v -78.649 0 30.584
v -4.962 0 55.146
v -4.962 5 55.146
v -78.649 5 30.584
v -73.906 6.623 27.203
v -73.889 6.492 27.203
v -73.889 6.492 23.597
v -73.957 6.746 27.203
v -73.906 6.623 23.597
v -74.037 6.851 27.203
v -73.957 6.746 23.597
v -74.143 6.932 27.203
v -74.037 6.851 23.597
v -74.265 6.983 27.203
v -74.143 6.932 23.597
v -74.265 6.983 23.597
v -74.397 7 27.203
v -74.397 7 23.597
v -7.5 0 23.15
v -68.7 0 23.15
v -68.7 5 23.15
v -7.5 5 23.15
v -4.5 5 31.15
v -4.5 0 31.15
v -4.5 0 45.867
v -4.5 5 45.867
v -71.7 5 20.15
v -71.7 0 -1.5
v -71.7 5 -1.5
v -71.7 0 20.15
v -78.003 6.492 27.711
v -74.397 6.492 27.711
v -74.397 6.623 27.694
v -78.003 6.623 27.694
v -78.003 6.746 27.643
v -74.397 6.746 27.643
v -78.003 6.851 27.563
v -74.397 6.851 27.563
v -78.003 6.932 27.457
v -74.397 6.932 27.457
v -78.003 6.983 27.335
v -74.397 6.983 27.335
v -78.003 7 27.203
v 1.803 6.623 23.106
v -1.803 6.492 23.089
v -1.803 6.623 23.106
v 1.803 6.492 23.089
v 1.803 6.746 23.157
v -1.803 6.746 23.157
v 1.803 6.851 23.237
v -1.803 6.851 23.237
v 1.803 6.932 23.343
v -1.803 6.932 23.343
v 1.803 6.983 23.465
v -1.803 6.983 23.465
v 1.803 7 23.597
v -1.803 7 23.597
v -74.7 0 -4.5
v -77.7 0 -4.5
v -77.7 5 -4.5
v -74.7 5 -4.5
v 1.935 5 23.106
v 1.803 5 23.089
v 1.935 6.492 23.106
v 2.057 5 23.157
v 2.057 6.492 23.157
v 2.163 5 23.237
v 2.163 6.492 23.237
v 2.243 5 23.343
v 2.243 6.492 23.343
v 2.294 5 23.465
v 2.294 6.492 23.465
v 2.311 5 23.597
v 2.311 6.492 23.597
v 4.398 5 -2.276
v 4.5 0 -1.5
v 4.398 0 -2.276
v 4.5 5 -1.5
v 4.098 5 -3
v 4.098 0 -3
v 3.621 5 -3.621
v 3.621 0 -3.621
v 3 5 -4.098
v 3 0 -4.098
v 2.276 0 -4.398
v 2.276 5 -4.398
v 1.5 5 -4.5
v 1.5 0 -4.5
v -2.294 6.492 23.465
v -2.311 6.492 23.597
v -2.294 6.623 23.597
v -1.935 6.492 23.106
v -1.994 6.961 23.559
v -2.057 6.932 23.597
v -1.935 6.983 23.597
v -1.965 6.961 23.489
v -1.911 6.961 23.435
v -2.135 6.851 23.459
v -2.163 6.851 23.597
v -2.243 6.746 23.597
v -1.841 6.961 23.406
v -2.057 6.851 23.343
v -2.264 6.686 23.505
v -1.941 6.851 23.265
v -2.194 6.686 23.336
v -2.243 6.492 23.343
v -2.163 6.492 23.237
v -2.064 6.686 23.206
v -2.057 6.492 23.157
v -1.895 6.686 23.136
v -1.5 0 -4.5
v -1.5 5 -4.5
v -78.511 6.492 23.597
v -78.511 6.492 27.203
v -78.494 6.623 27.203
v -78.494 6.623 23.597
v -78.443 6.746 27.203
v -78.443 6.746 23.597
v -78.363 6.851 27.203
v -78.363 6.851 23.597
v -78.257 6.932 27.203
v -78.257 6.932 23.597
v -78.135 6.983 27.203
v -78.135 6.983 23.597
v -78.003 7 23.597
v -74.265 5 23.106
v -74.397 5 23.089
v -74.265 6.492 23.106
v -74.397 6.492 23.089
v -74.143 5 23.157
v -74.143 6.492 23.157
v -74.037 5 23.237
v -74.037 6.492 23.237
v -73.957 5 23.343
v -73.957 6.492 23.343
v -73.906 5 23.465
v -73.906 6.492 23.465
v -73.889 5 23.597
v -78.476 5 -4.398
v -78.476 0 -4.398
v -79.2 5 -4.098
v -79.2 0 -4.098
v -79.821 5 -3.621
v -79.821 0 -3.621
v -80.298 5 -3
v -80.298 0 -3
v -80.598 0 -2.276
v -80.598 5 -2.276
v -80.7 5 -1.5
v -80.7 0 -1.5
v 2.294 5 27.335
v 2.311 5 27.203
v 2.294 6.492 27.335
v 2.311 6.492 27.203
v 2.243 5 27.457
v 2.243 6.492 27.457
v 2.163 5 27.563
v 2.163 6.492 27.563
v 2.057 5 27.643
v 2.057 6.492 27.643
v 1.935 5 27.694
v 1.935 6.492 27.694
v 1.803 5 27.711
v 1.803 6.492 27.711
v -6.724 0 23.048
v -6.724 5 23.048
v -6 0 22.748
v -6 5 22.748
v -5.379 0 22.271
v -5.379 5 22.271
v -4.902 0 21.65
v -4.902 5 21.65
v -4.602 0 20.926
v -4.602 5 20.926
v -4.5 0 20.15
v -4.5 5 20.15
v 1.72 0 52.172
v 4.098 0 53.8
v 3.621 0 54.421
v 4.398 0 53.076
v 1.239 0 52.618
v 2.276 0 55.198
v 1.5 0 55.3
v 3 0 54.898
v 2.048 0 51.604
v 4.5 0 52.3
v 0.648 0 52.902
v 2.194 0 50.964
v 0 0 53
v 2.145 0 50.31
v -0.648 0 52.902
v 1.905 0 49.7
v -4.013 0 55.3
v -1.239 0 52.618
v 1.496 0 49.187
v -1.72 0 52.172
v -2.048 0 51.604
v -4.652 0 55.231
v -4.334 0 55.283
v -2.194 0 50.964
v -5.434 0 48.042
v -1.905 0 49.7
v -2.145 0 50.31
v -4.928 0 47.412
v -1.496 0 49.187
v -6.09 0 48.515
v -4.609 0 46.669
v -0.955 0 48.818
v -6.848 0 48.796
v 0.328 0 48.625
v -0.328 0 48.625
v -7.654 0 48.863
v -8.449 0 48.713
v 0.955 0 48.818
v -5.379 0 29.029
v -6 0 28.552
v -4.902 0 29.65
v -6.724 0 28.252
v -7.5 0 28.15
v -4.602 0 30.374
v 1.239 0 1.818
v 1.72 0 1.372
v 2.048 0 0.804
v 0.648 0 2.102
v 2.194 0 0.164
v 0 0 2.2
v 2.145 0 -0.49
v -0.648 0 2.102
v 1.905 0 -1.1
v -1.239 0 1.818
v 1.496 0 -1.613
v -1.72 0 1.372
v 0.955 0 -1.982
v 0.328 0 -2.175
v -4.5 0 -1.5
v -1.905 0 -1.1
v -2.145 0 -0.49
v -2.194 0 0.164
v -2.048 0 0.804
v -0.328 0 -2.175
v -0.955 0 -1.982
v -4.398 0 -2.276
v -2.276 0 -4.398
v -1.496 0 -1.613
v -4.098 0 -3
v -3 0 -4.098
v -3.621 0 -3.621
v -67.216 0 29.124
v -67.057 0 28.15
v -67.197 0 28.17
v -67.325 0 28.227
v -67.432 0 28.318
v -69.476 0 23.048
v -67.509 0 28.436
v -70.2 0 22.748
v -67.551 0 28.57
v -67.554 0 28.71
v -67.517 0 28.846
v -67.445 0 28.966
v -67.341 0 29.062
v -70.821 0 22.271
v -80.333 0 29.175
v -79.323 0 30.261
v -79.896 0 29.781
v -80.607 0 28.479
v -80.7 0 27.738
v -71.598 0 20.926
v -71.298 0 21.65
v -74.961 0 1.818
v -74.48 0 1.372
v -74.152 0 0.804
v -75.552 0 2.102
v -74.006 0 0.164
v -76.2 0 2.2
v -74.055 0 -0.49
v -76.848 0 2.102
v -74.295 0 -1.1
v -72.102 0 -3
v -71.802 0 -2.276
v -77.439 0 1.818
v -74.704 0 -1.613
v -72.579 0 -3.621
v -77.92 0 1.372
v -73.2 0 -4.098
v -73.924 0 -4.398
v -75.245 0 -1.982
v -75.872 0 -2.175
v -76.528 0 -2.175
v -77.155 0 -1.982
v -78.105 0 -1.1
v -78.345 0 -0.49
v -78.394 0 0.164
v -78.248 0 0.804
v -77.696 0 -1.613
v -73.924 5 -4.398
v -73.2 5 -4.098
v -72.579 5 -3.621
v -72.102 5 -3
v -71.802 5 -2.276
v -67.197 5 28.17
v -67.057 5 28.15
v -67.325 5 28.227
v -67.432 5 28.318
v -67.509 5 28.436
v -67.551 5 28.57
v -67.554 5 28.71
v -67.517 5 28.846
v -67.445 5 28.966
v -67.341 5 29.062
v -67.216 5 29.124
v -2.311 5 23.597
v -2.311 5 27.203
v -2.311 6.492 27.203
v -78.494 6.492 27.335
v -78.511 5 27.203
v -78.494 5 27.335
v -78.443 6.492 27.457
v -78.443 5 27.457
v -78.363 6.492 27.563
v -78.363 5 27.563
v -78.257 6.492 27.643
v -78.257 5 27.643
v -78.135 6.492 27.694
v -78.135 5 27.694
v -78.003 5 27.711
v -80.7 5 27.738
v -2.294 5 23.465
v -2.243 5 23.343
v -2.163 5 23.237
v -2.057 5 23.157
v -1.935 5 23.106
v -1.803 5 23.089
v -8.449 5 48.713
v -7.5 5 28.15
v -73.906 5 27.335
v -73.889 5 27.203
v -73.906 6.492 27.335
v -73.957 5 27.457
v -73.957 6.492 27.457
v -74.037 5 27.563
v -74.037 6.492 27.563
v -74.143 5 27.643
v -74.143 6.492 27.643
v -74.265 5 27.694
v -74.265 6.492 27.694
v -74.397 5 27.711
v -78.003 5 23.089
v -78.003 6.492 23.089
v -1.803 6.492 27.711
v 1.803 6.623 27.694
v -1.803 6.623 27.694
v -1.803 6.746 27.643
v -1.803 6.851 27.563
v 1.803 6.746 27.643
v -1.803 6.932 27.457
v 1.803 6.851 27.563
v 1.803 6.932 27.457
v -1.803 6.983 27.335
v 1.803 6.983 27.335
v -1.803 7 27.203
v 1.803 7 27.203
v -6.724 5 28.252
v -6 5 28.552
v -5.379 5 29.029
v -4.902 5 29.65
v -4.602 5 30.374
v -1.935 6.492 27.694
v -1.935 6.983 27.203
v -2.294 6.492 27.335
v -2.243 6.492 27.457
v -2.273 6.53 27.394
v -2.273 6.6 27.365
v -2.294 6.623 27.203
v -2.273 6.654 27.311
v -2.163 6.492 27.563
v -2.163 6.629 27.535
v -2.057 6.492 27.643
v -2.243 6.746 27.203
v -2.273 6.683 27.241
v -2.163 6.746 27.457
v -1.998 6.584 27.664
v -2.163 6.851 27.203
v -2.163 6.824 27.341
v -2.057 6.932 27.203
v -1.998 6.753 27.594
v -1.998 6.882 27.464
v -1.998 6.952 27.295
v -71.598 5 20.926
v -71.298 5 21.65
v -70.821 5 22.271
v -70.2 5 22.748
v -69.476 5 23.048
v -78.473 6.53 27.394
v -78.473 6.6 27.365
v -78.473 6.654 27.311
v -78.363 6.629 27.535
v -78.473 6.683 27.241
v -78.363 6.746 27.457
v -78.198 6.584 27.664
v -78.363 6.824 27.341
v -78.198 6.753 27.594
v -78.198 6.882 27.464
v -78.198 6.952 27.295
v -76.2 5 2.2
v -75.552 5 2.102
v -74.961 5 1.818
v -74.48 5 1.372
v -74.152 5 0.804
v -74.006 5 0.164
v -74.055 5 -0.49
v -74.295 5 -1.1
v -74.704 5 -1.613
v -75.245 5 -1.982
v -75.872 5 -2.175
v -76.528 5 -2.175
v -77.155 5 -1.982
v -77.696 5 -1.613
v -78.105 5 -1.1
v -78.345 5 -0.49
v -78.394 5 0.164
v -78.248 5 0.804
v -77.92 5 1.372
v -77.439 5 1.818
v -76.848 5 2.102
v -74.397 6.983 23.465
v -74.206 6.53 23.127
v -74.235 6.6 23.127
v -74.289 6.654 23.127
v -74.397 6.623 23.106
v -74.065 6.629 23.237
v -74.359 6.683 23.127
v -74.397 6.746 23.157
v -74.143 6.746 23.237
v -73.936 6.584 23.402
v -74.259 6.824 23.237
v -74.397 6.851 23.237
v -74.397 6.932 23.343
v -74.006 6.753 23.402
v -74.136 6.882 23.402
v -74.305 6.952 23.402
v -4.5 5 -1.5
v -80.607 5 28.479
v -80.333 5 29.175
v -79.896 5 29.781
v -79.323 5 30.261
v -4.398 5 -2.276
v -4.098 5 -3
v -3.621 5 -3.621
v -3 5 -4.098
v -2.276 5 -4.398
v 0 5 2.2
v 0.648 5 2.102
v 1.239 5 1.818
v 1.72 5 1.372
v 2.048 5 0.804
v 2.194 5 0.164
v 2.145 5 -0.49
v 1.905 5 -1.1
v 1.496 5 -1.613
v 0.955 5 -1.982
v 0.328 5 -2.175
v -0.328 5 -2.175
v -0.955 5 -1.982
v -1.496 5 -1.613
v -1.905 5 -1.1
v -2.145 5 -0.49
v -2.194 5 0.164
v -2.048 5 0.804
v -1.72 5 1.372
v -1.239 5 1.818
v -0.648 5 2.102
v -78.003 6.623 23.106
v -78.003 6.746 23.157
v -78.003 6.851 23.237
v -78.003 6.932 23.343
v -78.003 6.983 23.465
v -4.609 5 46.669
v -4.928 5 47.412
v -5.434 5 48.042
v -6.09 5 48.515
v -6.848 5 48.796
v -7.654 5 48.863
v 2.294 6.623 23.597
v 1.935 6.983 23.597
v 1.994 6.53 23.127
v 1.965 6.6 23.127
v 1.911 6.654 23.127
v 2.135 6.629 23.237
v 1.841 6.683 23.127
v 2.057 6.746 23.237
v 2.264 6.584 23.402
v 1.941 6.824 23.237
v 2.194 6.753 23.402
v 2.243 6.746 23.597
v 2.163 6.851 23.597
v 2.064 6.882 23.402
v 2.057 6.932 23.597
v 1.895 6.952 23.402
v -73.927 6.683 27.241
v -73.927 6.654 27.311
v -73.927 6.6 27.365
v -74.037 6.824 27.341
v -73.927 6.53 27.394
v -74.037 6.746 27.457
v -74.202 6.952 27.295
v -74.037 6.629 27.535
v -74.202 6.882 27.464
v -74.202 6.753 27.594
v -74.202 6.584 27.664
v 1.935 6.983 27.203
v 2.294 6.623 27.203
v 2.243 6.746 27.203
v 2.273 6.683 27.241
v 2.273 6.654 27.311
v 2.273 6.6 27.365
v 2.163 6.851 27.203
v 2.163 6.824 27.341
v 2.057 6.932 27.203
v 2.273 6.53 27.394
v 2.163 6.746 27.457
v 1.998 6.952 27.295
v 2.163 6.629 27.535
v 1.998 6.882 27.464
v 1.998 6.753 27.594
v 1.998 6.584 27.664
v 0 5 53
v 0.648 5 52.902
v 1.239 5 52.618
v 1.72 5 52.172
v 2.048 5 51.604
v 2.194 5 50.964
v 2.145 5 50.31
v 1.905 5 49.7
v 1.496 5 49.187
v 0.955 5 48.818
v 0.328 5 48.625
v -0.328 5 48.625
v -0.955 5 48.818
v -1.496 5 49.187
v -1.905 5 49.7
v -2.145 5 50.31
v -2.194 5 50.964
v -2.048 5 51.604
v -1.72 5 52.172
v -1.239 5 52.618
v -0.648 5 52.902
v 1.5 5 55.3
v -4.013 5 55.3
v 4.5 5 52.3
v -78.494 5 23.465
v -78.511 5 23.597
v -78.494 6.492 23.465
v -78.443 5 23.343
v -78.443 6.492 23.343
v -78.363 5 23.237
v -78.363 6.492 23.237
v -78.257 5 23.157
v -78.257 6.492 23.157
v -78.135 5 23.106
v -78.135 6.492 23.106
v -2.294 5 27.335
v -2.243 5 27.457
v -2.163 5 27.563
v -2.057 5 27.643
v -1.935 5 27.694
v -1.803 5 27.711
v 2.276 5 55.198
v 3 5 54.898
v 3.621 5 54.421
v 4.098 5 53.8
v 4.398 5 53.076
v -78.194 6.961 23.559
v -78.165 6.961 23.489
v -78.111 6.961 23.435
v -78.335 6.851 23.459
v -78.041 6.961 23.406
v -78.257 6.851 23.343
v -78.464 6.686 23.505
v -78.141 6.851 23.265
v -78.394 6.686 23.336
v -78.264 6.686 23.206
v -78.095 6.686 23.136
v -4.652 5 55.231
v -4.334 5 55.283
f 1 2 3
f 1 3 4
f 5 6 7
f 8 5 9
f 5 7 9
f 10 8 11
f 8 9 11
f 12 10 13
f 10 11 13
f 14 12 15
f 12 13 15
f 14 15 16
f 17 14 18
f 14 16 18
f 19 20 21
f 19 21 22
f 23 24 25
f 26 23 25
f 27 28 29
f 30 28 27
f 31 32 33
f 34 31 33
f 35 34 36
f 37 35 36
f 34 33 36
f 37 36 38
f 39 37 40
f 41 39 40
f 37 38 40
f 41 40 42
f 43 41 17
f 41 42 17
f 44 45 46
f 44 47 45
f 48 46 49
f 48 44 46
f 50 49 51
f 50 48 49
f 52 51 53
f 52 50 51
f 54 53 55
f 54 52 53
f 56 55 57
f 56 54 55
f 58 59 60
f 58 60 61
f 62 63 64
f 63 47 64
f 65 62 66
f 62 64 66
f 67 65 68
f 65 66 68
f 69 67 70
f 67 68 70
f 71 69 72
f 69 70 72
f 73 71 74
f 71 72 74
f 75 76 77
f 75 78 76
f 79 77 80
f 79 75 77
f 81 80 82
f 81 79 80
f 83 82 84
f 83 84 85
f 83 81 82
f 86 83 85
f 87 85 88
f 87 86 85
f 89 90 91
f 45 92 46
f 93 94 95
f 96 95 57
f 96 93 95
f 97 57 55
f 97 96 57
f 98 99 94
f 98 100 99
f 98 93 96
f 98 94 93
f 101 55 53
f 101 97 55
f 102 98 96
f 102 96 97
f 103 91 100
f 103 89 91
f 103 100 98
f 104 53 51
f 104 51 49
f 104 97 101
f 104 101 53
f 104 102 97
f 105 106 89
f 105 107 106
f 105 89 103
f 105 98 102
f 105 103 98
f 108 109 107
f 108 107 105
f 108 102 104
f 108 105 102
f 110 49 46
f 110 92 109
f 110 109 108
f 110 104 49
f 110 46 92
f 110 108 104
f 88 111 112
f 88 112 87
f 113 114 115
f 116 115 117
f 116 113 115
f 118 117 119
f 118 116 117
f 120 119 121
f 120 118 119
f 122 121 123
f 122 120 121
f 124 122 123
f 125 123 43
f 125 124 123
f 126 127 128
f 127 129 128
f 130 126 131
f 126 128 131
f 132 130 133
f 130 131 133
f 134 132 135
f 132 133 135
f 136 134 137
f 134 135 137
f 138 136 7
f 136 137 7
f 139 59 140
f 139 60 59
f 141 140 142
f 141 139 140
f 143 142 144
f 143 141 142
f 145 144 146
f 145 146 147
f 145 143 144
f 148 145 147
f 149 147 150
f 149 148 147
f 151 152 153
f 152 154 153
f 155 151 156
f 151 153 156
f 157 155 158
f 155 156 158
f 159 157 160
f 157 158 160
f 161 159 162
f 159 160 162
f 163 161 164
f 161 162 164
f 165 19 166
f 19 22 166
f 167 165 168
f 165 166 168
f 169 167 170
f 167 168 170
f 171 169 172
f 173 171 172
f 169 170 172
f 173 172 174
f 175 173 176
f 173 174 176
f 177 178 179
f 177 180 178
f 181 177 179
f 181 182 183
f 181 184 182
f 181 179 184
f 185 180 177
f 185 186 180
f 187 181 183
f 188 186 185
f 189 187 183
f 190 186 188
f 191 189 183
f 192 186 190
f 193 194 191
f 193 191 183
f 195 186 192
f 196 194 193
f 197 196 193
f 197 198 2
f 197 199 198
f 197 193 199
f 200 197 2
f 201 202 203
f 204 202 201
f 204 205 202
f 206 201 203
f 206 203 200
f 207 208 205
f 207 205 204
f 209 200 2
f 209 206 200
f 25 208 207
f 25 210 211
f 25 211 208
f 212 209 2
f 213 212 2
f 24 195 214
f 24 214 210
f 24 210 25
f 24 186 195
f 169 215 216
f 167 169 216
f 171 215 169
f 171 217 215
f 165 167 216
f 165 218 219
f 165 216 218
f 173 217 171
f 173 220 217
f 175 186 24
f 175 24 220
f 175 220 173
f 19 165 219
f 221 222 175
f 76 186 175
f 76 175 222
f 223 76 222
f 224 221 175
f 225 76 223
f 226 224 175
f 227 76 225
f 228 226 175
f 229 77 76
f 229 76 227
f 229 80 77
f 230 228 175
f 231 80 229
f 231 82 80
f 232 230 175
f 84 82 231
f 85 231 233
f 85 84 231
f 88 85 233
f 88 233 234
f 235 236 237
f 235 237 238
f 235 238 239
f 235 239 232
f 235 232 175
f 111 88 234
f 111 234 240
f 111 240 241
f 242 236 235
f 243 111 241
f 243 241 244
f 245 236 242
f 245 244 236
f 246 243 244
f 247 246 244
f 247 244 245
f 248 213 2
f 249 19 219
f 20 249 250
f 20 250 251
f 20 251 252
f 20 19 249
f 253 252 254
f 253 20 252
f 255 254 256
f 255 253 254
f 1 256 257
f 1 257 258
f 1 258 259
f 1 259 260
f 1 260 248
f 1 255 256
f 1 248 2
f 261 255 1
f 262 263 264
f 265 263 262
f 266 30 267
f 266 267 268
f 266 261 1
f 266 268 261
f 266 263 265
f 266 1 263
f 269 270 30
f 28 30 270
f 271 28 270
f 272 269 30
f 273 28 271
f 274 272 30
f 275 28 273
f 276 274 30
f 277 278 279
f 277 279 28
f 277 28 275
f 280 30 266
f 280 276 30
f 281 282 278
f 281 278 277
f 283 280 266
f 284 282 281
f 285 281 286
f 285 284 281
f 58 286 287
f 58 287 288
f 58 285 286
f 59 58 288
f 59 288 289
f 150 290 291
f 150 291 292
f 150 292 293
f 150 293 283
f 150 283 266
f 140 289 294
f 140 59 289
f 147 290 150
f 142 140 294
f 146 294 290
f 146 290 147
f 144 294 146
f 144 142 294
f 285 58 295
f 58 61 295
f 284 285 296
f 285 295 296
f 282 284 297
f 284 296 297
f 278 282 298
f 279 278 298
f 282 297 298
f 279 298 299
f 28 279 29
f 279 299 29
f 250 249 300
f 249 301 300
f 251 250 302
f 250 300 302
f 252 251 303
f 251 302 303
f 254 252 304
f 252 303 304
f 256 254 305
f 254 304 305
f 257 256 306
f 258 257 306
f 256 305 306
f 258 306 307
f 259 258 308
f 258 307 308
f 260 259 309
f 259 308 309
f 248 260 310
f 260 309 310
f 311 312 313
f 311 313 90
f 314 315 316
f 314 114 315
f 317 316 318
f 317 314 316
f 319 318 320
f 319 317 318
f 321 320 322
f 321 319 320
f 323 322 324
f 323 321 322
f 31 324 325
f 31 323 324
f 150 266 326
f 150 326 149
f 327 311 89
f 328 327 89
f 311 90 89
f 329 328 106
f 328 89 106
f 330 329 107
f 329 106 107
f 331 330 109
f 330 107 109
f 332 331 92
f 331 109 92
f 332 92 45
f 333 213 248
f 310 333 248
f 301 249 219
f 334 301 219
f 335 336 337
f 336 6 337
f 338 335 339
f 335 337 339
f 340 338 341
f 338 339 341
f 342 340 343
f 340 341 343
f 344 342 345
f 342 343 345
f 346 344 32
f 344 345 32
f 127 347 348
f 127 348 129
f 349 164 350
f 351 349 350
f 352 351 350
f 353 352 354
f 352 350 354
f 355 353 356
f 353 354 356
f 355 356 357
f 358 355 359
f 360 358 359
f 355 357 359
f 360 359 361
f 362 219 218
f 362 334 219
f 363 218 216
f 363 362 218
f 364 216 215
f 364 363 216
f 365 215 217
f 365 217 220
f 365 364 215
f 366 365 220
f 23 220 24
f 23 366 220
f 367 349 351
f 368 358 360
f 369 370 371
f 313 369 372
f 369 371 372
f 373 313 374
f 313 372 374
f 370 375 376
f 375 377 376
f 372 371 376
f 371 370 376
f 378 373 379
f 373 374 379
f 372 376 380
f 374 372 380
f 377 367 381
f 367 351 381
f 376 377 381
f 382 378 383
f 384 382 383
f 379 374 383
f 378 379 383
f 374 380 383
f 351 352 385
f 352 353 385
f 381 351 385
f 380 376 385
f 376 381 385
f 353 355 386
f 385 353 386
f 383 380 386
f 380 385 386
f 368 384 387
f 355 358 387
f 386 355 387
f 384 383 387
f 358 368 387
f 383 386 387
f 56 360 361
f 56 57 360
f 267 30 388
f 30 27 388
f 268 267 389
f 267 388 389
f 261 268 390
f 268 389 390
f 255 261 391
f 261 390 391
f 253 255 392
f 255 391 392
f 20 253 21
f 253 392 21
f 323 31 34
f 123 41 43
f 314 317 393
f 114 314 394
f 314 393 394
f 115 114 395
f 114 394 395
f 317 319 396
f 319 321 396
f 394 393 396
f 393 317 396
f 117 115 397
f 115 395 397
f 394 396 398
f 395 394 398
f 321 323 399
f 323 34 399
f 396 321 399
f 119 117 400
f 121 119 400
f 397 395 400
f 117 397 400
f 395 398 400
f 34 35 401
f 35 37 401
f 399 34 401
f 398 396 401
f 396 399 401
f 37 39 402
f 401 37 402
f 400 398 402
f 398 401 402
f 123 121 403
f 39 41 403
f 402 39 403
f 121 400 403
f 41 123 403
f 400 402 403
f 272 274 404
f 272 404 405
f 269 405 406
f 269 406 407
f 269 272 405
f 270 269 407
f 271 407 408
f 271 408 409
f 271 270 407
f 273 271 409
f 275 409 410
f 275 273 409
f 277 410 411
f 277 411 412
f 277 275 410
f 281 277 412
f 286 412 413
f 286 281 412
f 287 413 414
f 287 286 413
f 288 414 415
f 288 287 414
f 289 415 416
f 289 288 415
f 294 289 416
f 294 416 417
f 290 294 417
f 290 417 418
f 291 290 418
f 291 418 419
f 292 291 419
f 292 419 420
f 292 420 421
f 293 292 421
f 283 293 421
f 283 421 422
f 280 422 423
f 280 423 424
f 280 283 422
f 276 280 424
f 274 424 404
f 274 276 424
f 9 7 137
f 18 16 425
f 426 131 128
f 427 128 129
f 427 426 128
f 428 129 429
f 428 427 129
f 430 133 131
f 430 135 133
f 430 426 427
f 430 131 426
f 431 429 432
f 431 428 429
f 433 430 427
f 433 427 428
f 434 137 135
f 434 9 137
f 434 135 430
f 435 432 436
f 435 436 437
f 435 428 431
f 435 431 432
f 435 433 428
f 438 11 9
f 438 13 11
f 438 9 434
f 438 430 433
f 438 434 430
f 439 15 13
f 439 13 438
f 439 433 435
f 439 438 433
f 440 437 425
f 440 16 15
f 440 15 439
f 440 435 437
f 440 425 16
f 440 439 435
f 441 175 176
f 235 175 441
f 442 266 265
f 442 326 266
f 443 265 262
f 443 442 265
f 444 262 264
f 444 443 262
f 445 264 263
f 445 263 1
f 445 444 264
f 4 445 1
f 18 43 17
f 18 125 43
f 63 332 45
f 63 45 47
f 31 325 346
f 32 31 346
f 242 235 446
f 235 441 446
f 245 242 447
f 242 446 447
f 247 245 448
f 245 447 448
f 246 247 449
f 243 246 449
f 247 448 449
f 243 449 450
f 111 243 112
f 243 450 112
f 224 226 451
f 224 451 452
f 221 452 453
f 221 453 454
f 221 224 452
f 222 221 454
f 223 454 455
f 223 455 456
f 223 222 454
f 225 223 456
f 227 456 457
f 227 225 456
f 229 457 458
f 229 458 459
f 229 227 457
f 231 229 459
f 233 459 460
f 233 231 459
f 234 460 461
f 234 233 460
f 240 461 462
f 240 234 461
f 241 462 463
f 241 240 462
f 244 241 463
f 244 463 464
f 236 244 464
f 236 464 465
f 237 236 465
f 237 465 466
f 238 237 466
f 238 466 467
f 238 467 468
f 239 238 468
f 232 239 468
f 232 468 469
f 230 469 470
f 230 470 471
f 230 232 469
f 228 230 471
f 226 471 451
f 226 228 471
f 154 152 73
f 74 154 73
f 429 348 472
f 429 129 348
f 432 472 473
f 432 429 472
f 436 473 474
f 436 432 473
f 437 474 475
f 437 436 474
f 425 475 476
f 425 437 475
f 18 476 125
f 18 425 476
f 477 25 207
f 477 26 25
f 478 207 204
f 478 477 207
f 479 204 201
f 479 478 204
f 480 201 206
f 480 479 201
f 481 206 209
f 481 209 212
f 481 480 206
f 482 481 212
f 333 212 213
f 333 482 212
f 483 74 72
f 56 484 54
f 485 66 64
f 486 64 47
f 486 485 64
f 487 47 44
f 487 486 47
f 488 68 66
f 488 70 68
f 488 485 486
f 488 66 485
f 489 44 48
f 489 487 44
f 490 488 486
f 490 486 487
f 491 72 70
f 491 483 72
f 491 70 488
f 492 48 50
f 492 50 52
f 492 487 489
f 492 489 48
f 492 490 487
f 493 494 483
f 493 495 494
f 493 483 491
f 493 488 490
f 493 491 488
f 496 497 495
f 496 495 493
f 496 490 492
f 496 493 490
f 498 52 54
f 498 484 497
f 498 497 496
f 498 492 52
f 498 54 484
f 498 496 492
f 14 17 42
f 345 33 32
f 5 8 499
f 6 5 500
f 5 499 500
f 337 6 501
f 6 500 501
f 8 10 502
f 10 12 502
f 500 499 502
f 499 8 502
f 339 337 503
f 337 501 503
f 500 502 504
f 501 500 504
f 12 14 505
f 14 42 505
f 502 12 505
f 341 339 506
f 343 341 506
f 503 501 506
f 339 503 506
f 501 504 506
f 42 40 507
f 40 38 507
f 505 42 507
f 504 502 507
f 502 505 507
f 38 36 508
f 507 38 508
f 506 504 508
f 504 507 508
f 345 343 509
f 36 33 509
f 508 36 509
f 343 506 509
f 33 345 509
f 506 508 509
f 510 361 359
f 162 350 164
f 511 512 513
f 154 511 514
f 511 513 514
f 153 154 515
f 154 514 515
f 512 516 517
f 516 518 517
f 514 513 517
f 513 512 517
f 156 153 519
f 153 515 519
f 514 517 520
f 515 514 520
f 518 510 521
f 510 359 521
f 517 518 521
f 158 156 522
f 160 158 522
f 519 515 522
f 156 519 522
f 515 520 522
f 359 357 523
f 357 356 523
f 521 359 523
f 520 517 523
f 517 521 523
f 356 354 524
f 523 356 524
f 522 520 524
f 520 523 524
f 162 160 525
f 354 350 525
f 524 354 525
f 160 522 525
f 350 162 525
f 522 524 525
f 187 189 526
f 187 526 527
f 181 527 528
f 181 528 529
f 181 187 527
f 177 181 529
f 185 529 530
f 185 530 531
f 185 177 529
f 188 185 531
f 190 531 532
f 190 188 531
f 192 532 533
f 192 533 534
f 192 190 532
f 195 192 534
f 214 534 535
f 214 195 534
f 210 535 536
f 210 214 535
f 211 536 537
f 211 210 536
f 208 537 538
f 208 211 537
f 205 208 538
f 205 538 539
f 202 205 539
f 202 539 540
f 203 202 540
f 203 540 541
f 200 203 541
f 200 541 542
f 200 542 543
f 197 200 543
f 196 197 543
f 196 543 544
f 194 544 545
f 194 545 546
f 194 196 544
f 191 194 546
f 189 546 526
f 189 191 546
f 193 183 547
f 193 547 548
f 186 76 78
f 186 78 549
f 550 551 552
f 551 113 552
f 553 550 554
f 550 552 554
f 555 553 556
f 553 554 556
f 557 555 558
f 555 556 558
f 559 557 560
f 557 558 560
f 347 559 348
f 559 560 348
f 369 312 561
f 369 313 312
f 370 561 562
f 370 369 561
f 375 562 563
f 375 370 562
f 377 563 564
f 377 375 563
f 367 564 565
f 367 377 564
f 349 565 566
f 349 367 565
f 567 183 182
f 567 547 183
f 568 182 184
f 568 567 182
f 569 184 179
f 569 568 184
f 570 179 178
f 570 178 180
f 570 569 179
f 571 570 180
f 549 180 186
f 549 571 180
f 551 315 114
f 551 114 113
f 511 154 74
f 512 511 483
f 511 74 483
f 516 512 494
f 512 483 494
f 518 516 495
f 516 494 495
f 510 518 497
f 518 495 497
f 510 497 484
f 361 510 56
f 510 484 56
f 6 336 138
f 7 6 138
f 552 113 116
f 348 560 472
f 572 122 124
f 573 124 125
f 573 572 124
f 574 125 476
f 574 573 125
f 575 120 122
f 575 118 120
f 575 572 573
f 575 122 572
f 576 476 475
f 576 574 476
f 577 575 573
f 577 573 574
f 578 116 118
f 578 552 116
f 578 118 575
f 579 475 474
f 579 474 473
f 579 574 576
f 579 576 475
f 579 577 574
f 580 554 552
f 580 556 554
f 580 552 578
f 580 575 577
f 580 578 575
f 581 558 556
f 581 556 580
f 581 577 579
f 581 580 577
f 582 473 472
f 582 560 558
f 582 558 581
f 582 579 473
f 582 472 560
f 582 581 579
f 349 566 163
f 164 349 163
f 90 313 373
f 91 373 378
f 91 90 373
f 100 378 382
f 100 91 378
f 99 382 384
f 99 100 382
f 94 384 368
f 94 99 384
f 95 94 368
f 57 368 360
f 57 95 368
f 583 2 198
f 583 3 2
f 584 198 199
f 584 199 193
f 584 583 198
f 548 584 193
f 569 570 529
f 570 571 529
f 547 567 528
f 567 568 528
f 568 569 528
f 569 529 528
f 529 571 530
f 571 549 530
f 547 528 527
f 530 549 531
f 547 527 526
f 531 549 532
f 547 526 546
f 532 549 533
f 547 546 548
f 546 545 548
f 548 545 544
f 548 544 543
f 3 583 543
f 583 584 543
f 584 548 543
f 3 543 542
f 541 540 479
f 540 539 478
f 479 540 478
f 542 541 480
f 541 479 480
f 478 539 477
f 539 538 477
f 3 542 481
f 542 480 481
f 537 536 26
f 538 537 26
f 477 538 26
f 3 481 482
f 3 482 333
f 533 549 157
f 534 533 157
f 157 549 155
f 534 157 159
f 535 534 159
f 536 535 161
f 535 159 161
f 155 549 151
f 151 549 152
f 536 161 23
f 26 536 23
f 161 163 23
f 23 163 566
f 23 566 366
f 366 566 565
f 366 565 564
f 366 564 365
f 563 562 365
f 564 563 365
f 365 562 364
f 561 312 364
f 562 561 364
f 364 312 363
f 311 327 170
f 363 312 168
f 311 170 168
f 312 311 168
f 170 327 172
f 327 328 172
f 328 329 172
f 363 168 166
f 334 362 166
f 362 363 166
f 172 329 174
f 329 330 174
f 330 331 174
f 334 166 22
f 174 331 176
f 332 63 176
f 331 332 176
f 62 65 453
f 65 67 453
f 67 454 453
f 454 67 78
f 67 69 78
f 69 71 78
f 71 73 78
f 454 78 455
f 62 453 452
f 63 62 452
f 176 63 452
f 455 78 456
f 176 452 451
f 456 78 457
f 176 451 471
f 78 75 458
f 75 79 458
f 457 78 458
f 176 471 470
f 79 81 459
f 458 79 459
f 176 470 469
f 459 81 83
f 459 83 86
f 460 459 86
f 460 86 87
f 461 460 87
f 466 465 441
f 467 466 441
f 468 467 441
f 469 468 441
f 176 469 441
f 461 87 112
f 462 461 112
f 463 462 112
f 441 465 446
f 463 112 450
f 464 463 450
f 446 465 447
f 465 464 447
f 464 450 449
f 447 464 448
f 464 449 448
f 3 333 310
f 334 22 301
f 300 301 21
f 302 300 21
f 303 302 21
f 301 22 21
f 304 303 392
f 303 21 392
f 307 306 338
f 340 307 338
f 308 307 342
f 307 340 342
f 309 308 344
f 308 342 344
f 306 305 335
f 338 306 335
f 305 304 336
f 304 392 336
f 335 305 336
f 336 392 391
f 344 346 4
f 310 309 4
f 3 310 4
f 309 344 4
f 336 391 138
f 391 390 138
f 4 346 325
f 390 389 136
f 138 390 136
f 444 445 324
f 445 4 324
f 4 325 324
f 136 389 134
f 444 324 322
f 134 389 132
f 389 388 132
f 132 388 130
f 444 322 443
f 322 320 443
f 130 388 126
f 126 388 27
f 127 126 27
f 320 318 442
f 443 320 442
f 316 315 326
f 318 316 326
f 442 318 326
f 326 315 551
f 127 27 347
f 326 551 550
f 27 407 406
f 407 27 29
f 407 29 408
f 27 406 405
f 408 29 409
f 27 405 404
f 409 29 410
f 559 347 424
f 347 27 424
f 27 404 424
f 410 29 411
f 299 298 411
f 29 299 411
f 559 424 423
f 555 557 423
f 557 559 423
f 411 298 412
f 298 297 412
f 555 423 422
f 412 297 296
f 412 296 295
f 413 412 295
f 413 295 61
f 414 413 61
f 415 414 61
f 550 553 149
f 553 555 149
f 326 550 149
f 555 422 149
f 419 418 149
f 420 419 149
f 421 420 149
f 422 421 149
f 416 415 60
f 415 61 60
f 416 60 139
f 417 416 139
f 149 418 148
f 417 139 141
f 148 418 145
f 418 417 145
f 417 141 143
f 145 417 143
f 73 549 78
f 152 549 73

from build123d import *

# Parameters (mm, degrees)
SKETCH1_R           = 2.2
BOSS_EXTRUDE1_DEPTH = 5
BOSS_EXTRUDE2_START = 5
SKETCH1_3_W         = 4.6228
SKETCH1_3_H         = 4.6228
BOSS_EXTRUDE2_DEPTH = 2
FILLET1_R           = 3
FILLET2_R           = 0.508
FILLET3_R           = 0.5


with BuildPart() as part:
    # Sketch1 → Boss-Extrude1 (new body)
    with BuildSketch(Plane(origin=(0, 0, 0), x_dir=(1, 0, 0), z_dir=(0, 1, 0))):
        Polygon((-80.7, 4.5), (-71.7, 4.5), (-71.7, -23.15), (-4.5, -23.15), (-4.5, 4.5), (4.5, 4.5), (4.5, -55.3), (-4.5, -55.3), (-80.7, -29.9), align=None)
        with Locations(Location((0, 0, 0), (0, 0, 270))):
            Circle(SKETCH1_R, mode=Mode.SUBTRACT)
        with Locations(Location((-76.2, 0, 0), (0, 0, 270))):
            Circle(SKETCH1_R, mode=Mode.SUBTRACT)
        with Locations(Location((0, -50.8, 0), (0, 0, 270))):
            Circle(SKETCH1_R, mode=Mode.SUBTRACT)
        Polygon((-70.138611699, -28.15), (-4.5, -28.15), (-4.5, -50.029537233), align=None, mode=Mode.SUBTRACT)
    extrude(amount=BOSS_EXTRUDE1_DEPTH)

    # Sketch1<3> → Boss-Extrude2 (add)
    with BuildSketch(Plane(origin=(0, 0, 0), x_dir=(1, 0, 0), z_dir=(0, 1, 0)).offset(BOSS_EXTRUDE2_START)):
        with Locations((-76.2, -25.4)):
            Rectangle(SKETCH1_3_W, SKETCH1_3_H)
        with Locations((0, -25.4)):
            Rectangle(SKETCH1_3_W, SKETCH1_3_H)
    extrude(amount=BOSS_EXTRUDE2_DEPTH)

    # Fillet1
    fillet1_edges = [part.edges().sort_by_distance(p)[0] for p in [
        (-4.5, 2.5, 28.15),
        (-4.5, 2.5, 50.029537233),
        (-80.7, 2.5, -4.5),
        (-71.7, 2.5, -4.5),
        (-71.7, 2.5, 23.15),
        (-4.5, 2.5, 23.15),
        (-4.5, 2.5, -4.5),
        (4.5, 2.5, -4.5),
        (4.5, 2.5, 55.3),
        (-4.5, 2.5, 55.3),
        (-80.7, 2.5, 29.9),
    ]]
    fillet(fillet1_edges, radius=FILLET1_R)

    # Fillet2
    fillet2_edges = [part.edges().sort_by_distance(p)[0] for p in [
        (-78.5114, 6, 23.0886),
        (-76.2, 7, 27.7114),
        (-78.5114, 6, 27.7114),
        (-73.8886, 7, 25.4),
        (-73.8886, 6, 27.7114),
        (-73.8886, 6, 23.0886),
        (-78.5114, 7, 25.4),
        (-76.2, 7, 23.0886),
        (-2.3114, 6, 23.0886),
        (0, 7, 27.7114),
        (-2.3114, 6, 27.7114),
        (2.3114, 7, 25.4),
        (2.3114, 6, 27.7114),
        (2.3114, 6, 23.0886),
        (-2.3114, 7, 25.4),
        (0, 7, 23.0886),
    ]]
    fillet(fillet2_edges, radius=FILLET2_R)

    # Fillet3
    fillet3_edges = [part.edges().sort_by_distance(p)[0] for p in [
        (-70.138611699, 2.5, 28.15),
    ]]
    fillet(fillet3_edges, radius=FILLET3_R)


solid = part.part
